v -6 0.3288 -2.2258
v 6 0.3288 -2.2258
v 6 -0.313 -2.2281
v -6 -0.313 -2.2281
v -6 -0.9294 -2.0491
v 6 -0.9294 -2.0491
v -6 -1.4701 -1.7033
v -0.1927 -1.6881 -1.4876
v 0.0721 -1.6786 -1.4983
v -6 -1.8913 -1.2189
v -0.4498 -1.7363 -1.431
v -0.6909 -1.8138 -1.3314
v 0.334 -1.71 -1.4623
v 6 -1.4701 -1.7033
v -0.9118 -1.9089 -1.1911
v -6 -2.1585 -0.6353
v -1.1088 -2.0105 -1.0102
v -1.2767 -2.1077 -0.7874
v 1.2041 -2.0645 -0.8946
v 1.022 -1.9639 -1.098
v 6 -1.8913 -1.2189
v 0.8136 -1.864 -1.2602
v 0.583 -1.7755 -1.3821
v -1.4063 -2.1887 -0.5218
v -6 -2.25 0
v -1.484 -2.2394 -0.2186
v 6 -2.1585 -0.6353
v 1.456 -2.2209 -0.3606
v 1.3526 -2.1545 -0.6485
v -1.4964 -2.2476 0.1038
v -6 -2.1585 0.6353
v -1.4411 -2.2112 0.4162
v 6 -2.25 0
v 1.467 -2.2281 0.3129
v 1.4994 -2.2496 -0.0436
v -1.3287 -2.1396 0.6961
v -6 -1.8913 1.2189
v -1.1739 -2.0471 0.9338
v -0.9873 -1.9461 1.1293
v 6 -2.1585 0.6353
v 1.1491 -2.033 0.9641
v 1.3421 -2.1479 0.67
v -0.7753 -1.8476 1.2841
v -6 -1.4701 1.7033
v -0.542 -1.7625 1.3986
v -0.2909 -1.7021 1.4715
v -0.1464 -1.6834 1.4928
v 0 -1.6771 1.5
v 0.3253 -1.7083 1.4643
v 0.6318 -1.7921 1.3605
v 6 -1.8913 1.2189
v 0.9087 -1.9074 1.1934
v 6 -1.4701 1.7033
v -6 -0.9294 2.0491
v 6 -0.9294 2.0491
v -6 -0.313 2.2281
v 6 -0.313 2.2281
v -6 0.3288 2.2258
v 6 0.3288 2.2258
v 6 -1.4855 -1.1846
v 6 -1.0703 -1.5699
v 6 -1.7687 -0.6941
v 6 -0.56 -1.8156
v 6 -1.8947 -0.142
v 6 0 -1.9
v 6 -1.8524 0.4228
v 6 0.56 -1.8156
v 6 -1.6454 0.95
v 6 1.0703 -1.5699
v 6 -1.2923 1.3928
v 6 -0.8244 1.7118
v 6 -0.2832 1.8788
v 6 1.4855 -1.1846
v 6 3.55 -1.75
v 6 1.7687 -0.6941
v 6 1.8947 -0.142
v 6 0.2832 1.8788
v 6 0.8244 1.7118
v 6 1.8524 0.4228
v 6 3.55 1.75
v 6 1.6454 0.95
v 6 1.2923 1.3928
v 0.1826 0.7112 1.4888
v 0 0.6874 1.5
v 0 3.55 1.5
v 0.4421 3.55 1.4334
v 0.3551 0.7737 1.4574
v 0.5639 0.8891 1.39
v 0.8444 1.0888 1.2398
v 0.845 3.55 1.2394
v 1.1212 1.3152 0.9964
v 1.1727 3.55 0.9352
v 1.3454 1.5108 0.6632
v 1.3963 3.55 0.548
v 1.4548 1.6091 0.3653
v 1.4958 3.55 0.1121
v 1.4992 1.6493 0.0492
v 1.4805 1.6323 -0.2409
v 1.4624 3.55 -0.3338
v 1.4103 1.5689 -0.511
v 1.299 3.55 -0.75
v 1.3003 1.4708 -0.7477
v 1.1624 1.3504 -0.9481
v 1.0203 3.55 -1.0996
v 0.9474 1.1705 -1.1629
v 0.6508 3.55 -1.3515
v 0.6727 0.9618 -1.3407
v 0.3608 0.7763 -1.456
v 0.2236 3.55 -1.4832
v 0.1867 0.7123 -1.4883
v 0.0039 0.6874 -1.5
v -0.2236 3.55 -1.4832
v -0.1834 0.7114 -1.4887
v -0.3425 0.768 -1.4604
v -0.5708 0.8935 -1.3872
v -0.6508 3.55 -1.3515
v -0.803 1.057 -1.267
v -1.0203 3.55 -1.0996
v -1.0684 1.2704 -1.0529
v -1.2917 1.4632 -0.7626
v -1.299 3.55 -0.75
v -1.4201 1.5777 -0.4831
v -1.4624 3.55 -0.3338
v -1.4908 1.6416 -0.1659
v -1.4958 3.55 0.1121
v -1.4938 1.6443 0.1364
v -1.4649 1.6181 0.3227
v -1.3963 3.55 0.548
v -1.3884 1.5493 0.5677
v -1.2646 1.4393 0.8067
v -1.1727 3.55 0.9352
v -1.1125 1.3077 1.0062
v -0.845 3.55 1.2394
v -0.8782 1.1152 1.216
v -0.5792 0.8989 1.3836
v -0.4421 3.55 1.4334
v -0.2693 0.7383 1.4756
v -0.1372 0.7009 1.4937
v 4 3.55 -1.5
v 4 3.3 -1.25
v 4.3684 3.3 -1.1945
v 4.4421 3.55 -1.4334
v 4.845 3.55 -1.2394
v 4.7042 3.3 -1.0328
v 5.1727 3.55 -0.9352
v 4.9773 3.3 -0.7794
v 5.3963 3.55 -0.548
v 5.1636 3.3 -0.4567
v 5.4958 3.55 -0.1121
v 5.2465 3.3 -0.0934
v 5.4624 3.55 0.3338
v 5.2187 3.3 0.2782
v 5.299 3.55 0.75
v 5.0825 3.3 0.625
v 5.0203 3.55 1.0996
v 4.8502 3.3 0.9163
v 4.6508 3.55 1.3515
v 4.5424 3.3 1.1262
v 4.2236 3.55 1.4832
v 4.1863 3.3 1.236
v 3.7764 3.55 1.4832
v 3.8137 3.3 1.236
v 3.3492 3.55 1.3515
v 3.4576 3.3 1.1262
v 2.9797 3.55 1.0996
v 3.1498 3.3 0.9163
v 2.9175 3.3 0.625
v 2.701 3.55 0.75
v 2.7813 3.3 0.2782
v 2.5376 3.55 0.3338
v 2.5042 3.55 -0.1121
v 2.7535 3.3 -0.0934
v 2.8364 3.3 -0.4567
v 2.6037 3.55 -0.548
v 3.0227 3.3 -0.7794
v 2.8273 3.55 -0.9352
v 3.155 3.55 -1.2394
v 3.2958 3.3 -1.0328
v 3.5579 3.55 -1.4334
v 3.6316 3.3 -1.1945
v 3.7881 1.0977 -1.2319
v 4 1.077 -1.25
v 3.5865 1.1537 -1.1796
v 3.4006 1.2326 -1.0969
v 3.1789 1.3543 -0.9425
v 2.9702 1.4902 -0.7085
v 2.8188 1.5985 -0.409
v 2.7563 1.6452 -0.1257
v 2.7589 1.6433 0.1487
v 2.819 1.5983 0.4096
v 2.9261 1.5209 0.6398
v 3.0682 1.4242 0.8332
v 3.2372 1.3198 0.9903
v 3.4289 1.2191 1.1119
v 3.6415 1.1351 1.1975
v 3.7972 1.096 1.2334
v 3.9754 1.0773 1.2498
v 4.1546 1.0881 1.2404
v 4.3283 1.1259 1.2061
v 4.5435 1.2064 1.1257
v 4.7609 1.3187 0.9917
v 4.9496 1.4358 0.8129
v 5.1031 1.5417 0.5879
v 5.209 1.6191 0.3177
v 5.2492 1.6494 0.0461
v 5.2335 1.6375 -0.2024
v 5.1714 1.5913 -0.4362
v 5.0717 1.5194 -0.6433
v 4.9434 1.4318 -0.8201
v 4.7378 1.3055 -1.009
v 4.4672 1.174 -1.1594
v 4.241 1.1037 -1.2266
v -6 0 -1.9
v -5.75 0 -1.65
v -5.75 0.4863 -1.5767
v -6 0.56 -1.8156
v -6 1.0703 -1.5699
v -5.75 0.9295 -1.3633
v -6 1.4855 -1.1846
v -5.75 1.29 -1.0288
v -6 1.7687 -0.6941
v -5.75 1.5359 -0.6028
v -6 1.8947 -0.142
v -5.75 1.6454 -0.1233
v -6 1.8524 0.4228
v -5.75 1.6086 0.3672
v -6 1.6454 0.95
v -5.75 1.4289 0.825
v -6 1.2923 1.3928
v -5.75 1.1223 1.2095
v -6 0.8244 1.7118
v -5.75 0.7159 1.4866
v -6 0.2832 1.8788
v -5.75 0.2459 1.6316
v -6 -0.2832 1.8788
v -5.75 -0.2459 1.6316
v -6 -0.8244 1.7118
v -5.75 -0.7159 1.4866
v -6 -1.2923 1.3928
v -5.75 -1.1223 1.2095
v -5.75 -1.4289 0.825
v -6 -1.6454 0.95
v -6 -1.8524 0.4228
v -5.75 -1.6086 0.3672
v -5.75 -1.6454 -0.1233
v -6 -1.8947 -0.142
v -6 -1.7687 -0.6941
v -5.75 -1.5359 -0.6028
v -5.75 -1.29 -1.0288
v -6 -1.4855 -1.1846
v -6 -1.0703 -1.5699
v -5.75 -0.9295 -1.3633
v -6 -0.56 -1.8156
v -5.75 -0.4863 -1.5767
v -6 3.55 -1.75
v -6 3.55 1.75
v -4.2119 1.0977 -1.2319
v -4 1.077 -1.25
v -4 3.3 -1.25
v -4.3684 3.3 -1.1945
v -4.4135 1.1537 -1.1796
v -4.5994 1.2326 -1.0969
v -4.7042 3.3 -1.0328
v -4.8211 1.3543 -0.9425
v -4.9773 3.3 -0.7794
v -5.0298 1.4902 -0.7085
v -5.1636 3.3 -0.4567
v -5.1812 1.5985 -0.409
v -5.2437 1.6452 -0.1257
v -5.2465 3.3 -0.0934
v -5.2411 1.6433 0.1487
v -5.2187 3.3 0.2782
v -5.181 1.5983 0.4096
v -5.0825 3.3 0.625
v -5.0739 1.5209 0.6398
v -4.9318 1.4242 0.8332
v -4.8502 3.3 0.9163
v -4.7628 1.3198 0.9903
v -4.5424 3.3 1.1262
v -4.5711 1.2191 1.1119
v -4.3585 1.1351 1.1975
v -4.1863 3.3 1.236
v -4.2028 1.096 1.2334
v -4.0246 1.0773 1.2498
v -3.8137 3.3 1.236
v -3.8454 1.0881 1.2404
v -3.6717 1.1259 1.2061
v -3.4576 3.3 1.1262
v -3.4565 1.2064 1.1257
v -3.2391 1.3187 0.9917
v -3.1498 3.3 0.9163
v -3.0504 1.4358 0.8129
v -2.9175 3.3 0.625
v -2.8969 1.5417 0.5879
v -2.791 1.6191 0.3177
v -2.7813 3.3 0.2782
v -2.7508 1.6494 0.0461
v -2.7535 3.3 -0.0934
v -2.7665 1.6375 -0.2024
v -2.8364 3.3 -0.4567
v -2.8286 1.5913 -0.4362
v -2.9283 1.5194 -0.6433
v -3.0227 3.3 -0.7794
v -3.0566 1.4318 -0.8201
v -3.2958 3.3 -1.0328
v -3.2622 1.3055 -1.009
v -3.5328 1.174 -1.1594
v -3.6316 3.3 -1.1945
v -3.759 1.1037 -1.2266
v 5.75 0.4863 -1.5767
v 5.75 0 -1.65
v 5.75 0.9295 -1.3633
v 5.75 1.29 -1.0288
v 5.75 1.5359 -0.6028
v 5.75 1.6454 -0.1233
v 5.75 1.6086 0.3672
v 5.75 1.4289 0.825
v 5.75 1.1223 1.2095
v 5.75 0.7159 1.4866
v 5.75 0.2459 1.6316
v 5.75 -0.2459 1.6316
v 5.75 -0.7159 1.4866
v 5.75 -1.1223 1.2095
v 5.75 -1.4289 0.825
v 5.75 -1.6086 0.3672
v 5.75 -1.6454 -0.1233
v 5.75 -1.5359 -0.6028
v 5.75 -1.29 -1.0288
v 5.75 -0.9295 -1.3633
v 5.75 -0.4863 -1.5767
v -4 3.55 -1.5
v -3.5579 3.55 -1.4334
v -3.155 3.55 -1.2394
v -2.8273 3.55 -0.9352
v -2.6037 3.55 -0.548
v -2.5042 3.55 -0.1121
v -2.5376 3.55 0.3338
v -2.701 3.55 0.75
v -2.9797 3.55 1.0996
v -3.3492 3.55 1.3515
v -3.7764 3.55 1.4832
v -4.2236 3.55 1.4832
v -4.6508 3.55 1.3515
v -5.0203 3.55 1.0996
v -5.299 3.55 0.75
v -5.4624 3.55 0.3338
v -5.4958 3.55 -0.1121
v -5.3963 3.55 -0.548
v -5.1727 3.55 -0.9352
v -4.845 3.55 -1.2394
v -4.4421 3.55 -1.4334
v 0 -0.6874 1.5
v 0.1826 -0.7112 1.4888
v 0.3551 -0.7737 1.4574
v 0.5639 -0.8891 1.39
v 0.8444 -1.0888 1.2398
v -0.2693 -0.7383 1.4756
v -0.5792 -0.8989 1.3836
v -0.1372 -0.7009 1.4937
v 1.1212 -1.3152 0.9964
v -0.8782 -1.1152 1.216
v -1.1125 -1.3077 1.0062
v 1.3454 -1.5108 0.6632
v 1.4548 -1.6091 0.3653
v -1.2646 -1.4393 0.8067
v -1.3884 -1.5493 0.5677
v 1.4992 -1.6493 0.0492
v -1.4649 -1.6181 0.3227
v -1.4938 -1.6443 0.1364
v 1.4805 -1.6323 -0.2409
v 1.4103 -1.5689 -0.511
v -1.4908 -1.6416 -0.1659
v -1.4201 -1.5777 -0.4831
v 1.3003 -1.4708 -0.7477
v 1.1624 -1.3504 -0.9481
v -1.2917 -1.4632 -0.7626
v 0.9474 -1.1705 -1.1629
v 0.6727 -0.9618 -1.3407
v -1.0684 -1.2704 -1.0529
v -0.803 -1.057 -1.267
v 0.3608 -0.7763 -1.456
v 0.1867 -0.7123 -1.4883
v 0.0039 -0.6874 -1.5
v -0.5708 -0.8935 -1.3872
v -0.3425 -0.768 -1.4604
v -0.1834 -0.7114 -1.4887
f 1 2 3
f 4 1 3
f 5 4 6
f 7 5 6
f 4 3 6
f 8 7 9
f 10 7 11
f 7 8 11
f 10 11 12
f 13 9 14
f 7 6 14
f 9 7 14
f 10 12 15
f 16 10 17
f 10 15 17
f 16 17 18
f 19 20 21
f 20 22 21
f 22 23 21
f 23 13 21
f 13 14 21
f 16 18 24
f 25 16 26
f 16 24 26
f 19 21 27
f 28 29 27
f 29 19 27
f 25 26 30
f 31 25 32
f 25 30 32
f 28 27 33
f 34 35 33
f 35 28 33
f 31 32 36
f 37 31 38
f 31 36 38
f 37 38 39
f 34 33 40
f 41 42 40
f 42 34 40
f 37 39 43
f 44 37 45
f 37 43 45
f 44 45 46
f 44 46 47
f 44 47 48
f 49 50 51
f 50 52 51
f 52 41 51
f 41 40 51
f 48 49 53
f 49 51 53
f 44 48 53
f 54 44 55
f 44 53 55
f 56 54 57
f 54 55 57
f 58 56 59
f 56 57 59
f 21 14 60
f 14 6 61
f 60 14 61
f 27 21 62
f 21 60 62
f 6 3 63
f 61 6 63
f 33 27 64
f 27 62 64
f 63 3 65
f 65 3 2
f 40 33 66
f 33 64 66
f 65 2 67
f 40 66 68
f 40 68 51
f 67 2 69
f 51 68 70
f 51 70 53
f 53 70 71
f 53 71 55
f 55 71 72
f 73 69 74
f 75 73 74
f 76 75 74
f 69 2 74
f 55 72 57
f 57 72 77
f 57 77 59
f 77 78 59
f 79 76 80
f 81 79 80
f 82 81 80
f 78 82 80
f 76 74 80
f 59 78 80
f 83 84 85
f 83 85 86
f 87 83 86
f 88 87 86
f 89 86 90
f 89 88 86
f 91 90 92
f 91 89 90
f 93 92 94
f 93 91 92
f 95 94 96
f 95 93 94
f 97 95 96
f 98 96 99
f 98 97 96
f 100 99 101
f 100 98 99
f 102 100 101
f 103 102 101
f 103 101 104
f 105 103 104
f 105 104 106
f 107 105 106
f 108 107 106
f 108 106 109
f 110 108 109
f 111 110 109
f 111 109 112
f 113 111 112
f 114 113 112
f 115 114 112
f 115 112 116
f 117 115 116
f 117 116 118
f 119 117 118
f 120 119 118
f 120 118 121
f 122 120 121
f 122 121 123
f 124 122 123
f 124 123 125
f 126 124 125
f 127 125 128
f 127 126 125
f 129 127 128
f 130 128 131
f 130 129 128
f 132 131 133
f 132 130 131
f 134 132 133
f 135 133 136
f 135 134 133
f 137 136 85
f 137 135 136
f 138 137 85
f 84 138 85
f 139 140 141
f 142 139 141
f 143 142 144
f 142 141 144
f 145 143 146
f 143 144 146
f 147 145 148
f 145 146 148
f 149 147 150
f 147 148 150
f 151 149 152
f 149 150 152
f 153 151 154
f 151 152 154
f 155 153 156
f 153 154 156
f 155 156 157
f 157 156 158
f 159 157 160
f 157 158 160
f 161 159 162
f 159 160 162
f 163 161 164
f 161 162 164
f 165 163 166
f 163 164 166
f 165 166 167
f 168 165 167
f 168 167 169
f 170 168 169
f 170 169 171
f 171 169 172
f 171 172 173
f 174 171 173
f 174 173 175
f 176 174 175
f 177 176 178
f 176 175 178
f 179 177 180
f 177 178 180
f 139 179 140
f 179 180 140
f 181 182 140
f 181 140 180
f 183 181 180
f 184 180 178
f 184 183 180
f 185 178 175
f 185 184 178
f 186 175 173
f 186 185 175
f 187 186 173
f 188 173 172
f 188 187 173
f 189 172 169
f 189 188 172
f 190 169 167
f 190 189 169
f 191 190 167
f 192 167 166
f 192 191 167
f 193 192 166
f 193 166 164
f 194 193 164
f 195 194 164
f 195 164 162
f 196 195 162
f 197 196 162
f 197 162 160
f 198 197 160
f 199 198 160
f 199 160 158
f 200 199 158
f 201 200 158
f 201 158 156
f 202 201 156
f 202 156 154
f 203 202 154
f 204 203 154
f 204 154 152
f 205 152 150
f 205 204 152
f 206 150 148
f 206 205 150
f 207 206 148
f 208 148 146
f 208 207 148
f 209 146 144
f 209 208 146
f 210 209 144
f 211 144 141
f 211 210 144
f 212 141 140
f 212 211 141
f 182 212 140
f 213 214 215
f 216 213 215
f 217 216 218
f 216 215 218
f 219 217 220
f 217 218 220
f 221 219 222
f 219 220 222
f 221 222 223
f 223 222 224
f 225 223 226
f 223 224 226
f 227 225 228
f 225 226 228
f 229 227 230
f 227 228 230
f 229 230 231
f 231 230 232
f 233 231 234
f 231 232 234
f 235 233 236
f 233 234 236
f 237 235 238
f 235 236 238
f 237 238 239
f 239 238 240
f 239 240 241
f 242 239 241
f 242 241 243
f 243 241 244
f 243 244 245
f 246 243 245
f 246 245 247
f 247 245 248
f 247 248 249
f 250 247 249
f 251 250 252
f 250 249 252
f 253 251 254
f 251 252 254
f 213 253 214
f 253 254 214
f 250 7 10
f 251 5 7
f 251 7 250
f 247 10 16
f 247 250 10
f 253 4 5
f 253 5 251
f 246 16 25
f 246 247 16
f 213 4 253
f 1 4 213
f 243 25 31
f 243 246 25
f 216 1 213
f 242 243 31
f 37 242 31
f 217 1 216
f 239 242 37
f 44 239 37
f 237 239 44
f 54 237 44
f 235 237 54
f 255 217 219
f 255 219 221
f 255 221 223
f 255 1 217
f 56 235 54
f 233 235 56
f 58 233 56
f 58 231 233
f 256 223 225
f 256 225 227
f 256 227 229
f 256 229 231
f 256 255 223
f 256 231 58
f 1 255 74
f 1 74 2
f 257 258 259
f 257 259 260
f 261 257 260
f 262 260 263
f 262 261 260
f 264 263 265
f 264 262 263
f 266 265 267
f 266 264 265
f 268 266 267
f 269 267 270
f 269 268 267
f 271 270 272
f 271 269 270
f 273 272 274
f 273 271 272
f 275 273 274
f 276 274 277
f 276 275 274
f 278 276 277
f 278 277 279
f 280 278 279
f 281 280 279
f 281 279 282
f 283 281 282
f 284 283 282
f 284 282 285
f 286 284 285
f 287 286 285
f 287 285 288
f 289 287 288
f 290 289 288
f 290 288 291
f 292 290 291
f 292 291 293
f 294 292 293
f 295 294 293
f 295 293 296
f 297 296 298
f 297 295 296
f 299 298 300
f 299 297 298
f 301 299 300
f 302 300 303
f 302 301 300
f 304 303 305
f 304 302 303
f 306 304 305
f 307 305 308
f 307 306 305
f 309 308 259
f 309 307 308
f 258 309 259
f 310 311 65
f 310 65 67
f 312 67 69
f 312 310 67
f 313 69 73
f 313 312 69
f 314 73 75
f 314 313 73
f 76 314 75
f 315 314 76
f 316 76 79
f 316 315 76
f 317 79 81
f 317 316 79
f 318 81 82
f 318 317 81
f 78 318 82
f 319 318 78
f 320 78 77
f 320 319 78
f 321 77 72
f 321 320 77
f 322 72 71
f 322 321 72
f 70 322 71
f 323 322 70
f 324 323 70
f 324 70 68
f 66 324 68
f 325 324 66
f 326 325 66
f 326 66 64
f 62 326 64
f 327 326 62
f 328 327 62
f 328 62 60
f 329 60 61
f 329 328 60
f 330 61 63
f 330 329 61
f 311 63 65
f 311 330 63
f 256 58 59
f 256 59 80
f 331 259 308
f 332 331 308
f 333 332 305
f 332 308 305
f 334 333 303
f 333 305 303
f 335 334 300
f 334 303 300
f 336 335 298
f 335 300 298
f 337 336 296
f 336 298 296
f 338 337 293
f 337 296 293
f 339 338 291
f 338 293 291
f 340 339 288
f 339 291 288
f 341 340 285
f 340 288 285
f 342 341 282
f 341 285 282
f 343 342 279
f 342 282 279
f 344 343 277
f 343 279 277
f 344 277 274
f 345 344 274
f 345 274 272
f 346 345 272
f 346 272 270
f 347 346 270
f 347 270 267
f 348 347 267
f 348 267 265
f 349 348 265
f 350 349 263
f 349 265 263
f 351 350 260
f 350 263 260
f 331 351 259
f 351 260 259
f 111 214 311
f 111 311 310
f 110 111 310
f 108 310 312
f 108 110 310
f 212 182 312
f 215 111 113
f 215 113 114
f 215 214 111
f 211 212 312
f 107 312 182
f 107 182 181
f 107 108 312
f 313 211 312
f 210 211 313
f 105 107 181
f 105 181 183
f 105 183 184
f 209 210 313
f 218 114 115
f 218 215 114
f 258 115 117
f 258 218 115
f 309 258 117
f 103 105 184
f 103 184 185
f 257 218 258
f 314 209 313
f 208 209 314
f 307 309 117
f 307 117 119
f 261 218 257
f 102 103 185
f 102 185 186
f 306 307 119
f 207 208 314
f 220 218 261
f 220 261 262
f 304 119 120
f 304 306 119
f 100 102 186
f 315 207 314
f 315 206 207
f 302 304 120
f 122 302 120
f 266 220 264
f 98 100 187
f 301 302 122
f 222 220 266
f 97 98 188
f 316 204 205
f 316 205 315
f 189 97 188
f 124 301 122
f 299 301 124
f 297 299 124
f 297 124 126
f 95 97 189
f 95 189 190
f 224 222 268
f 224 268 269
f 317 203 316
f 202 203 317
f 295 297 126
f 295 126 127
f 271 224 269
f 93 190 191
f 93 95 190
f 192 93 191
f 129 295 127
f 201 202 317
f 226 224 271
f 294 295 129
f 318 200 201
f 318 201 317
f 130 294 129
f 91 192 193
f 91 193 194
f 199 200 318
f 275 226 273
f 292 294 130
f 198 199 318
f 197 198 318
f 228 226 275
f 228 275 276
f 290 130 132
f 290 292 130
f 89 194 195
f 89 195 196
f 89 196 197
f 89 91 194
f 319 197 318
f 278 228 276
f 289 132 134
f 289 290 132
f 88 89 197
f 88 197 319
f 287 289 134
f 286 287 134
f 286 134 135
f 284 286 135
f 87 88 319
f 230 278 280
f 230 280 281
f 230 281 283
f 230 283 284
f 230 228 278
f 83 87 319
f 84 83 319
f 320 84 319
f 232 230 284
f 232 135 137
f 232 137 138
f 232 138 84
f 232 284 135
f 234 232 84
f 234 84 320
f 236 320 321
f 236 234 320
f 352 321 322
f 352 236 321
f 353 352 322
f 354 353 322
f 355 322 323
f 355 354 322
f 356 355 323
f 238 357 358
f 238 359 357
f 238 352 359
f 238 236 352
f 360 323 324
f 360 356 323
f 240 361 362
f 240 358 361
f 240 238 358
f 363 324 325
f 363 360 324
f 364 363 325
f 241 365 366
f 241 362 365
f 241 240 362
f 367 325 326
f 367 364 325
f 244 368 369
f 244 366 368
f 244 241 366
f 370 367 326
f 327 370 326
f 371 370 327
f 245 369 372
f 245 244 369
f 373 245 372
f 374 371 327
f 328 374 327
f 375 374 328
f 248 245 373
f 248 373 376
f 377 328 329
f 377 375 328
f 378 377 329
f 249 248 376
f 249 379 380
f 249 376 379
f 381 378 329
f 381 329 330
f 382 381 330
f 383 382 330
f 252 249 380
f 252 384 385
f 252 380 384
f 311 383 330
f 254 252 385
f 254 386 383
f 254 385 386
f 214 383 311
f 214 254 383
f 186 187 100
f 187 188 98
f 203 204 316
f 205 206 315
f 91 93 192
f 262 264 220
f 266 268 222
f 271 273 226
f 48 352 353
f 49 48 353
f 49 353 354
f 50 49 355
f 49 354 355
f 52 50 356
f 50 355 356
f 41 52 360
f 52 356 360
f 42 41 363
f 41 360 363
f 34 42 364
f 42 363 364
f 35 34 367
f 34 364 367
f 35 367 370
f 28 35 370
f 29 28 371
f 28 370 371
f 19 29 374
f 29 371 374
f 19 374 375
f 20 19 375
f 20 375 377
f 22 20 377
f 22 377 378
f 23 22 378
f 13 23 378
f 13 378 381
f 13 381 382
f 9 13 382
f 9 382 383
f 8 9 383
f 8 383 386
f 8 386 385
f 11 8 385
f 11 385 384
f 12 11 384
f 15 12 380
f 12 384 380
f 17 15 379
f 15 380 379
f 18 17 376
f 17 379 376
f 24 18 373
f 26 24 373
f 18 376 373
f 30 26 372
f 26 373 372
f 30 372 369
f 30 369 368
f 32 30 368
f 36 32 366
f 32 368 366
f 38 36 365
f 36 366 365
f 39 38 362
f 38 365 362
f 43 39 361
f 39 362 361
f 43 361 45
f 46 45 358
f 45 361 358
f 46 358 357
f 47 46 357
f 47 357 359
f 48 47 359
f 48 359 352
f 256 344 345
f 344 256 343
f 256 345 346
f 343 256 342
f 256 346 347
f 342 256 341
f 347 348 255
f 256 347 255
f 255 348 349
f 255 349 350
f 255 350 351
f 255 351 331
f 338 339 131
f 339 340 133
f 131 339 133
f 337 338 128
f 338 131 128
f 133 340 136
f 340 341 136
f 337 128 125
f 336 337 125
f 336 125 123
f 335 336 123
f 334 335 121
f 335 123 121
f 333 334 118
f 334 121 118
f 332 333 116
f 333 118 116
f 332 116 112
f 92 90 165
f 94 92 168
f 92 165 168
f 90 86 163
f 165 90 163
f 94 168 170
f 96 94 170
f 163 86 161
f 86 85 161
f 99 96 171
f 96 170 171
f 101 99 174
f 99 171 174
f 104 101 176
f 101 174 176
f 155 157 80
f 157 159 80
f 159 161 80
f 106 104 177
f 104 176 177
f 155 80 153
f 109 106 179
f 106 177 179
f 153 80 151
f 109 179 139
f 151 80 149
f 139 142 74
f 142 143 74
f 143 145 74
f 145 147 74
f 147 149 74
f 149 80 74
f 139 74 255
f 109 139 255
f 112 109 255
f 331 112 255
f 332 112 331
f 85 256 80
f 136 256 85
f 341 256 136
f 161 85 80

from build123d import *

# Parameters (mm, degrees)
SKETCH1_R               = 1.65
EXTRUDE1_DEPTH          = 6
SKETCH2_R               = 1.25
CUT_EXTRUDE1_DEPTH      = 4.55
SKETCH3_R               = 1.5
CUT_EXTRUDE2_DEPTH      = 4.5500001
CUT_EXTRUDE2_DEPTH_BACK = 3.25
CHAMFER1_SIZE           = 0.25


with BuildPart() as part:
    # Sketch1 → Extrude1 (new body, symmetric)
    with BuildSketch(Plane(origin=(0, 0, 0), x_dir=(0, 0, -1), z_dir=(1, 0, 0))):
        with BuildLine():
            Line((-2.225844711, 0.328808945), (-1.75, 3.55))
            Line((-1.75, 3.55), (1.75, 3.55))
            Line((1.75, 3.55), (2.225844711, 0.328808945))
            ThreePointArc((2.225844711, 0.328808945), (0, -2.25), (-2.225844711, 0.328808945))
        make_face()
        Circle(SKETCH1_R, mode=Mode.SUBTRACT)
    extrude(amount=EXTRUDE1_DEPTH, both=True)

    # Sketch2 → Cut-Extrude1 (cut, through all)
    with BuildSketch(Plane(origin=(0, 0, 0), x_dir=(1, 0, 0), z_dir=(0, 1, 0))):
        with Locations(Location((-4, 0, 0), (0, 0, 90))):  # turned: the seam where the file's is
            Circle(SKETCH2_R)
        with Locations(Location((4, 0, 0), (0, 0, 90))):  # turned: the seam where the file's is
            Circle(SKETCH2_R)
    extrude(amount=CUT_EXTRUDE1_DEPTH, mode=Mode.SUBTRACT)

    # Sketch3 → Cut-Extrude2 (cut, two sides)
    with BuildSketch(Plane(origin=(0, 0, 0), x_dir=(1, 0, 0), z_dir=(0, 1, 0))) as cut_extrude2_sk:
        with Locations(Location((0, 0, 0), (0, 0, 270))):  # turned: the seam where the file's is
            Circle(SKETCH3_R)
    extrude(amount=CUT_EXTRUDE2_DEPTH, mode=Mode.SUBTRACT)
    extrude(cut_extrude2_sk.sketch, amount=-CUT_EXTRUDE2_DEPTH_BACK, mode=Mode.SUBTRACT)

    # Chamfer1
    chamfer1_edges = [part.edges().sort_by_distance(p)[0] for p in [
        (-6, 0, 1.65),
        (6, 0, 1.65),
        (-4, 3.55, 1.25),
        (4, 3.55, 1.25),
    ]]
    chamfer(chamfer1_edges, length=CHAMFER1_SIZE)


solid = part.part
